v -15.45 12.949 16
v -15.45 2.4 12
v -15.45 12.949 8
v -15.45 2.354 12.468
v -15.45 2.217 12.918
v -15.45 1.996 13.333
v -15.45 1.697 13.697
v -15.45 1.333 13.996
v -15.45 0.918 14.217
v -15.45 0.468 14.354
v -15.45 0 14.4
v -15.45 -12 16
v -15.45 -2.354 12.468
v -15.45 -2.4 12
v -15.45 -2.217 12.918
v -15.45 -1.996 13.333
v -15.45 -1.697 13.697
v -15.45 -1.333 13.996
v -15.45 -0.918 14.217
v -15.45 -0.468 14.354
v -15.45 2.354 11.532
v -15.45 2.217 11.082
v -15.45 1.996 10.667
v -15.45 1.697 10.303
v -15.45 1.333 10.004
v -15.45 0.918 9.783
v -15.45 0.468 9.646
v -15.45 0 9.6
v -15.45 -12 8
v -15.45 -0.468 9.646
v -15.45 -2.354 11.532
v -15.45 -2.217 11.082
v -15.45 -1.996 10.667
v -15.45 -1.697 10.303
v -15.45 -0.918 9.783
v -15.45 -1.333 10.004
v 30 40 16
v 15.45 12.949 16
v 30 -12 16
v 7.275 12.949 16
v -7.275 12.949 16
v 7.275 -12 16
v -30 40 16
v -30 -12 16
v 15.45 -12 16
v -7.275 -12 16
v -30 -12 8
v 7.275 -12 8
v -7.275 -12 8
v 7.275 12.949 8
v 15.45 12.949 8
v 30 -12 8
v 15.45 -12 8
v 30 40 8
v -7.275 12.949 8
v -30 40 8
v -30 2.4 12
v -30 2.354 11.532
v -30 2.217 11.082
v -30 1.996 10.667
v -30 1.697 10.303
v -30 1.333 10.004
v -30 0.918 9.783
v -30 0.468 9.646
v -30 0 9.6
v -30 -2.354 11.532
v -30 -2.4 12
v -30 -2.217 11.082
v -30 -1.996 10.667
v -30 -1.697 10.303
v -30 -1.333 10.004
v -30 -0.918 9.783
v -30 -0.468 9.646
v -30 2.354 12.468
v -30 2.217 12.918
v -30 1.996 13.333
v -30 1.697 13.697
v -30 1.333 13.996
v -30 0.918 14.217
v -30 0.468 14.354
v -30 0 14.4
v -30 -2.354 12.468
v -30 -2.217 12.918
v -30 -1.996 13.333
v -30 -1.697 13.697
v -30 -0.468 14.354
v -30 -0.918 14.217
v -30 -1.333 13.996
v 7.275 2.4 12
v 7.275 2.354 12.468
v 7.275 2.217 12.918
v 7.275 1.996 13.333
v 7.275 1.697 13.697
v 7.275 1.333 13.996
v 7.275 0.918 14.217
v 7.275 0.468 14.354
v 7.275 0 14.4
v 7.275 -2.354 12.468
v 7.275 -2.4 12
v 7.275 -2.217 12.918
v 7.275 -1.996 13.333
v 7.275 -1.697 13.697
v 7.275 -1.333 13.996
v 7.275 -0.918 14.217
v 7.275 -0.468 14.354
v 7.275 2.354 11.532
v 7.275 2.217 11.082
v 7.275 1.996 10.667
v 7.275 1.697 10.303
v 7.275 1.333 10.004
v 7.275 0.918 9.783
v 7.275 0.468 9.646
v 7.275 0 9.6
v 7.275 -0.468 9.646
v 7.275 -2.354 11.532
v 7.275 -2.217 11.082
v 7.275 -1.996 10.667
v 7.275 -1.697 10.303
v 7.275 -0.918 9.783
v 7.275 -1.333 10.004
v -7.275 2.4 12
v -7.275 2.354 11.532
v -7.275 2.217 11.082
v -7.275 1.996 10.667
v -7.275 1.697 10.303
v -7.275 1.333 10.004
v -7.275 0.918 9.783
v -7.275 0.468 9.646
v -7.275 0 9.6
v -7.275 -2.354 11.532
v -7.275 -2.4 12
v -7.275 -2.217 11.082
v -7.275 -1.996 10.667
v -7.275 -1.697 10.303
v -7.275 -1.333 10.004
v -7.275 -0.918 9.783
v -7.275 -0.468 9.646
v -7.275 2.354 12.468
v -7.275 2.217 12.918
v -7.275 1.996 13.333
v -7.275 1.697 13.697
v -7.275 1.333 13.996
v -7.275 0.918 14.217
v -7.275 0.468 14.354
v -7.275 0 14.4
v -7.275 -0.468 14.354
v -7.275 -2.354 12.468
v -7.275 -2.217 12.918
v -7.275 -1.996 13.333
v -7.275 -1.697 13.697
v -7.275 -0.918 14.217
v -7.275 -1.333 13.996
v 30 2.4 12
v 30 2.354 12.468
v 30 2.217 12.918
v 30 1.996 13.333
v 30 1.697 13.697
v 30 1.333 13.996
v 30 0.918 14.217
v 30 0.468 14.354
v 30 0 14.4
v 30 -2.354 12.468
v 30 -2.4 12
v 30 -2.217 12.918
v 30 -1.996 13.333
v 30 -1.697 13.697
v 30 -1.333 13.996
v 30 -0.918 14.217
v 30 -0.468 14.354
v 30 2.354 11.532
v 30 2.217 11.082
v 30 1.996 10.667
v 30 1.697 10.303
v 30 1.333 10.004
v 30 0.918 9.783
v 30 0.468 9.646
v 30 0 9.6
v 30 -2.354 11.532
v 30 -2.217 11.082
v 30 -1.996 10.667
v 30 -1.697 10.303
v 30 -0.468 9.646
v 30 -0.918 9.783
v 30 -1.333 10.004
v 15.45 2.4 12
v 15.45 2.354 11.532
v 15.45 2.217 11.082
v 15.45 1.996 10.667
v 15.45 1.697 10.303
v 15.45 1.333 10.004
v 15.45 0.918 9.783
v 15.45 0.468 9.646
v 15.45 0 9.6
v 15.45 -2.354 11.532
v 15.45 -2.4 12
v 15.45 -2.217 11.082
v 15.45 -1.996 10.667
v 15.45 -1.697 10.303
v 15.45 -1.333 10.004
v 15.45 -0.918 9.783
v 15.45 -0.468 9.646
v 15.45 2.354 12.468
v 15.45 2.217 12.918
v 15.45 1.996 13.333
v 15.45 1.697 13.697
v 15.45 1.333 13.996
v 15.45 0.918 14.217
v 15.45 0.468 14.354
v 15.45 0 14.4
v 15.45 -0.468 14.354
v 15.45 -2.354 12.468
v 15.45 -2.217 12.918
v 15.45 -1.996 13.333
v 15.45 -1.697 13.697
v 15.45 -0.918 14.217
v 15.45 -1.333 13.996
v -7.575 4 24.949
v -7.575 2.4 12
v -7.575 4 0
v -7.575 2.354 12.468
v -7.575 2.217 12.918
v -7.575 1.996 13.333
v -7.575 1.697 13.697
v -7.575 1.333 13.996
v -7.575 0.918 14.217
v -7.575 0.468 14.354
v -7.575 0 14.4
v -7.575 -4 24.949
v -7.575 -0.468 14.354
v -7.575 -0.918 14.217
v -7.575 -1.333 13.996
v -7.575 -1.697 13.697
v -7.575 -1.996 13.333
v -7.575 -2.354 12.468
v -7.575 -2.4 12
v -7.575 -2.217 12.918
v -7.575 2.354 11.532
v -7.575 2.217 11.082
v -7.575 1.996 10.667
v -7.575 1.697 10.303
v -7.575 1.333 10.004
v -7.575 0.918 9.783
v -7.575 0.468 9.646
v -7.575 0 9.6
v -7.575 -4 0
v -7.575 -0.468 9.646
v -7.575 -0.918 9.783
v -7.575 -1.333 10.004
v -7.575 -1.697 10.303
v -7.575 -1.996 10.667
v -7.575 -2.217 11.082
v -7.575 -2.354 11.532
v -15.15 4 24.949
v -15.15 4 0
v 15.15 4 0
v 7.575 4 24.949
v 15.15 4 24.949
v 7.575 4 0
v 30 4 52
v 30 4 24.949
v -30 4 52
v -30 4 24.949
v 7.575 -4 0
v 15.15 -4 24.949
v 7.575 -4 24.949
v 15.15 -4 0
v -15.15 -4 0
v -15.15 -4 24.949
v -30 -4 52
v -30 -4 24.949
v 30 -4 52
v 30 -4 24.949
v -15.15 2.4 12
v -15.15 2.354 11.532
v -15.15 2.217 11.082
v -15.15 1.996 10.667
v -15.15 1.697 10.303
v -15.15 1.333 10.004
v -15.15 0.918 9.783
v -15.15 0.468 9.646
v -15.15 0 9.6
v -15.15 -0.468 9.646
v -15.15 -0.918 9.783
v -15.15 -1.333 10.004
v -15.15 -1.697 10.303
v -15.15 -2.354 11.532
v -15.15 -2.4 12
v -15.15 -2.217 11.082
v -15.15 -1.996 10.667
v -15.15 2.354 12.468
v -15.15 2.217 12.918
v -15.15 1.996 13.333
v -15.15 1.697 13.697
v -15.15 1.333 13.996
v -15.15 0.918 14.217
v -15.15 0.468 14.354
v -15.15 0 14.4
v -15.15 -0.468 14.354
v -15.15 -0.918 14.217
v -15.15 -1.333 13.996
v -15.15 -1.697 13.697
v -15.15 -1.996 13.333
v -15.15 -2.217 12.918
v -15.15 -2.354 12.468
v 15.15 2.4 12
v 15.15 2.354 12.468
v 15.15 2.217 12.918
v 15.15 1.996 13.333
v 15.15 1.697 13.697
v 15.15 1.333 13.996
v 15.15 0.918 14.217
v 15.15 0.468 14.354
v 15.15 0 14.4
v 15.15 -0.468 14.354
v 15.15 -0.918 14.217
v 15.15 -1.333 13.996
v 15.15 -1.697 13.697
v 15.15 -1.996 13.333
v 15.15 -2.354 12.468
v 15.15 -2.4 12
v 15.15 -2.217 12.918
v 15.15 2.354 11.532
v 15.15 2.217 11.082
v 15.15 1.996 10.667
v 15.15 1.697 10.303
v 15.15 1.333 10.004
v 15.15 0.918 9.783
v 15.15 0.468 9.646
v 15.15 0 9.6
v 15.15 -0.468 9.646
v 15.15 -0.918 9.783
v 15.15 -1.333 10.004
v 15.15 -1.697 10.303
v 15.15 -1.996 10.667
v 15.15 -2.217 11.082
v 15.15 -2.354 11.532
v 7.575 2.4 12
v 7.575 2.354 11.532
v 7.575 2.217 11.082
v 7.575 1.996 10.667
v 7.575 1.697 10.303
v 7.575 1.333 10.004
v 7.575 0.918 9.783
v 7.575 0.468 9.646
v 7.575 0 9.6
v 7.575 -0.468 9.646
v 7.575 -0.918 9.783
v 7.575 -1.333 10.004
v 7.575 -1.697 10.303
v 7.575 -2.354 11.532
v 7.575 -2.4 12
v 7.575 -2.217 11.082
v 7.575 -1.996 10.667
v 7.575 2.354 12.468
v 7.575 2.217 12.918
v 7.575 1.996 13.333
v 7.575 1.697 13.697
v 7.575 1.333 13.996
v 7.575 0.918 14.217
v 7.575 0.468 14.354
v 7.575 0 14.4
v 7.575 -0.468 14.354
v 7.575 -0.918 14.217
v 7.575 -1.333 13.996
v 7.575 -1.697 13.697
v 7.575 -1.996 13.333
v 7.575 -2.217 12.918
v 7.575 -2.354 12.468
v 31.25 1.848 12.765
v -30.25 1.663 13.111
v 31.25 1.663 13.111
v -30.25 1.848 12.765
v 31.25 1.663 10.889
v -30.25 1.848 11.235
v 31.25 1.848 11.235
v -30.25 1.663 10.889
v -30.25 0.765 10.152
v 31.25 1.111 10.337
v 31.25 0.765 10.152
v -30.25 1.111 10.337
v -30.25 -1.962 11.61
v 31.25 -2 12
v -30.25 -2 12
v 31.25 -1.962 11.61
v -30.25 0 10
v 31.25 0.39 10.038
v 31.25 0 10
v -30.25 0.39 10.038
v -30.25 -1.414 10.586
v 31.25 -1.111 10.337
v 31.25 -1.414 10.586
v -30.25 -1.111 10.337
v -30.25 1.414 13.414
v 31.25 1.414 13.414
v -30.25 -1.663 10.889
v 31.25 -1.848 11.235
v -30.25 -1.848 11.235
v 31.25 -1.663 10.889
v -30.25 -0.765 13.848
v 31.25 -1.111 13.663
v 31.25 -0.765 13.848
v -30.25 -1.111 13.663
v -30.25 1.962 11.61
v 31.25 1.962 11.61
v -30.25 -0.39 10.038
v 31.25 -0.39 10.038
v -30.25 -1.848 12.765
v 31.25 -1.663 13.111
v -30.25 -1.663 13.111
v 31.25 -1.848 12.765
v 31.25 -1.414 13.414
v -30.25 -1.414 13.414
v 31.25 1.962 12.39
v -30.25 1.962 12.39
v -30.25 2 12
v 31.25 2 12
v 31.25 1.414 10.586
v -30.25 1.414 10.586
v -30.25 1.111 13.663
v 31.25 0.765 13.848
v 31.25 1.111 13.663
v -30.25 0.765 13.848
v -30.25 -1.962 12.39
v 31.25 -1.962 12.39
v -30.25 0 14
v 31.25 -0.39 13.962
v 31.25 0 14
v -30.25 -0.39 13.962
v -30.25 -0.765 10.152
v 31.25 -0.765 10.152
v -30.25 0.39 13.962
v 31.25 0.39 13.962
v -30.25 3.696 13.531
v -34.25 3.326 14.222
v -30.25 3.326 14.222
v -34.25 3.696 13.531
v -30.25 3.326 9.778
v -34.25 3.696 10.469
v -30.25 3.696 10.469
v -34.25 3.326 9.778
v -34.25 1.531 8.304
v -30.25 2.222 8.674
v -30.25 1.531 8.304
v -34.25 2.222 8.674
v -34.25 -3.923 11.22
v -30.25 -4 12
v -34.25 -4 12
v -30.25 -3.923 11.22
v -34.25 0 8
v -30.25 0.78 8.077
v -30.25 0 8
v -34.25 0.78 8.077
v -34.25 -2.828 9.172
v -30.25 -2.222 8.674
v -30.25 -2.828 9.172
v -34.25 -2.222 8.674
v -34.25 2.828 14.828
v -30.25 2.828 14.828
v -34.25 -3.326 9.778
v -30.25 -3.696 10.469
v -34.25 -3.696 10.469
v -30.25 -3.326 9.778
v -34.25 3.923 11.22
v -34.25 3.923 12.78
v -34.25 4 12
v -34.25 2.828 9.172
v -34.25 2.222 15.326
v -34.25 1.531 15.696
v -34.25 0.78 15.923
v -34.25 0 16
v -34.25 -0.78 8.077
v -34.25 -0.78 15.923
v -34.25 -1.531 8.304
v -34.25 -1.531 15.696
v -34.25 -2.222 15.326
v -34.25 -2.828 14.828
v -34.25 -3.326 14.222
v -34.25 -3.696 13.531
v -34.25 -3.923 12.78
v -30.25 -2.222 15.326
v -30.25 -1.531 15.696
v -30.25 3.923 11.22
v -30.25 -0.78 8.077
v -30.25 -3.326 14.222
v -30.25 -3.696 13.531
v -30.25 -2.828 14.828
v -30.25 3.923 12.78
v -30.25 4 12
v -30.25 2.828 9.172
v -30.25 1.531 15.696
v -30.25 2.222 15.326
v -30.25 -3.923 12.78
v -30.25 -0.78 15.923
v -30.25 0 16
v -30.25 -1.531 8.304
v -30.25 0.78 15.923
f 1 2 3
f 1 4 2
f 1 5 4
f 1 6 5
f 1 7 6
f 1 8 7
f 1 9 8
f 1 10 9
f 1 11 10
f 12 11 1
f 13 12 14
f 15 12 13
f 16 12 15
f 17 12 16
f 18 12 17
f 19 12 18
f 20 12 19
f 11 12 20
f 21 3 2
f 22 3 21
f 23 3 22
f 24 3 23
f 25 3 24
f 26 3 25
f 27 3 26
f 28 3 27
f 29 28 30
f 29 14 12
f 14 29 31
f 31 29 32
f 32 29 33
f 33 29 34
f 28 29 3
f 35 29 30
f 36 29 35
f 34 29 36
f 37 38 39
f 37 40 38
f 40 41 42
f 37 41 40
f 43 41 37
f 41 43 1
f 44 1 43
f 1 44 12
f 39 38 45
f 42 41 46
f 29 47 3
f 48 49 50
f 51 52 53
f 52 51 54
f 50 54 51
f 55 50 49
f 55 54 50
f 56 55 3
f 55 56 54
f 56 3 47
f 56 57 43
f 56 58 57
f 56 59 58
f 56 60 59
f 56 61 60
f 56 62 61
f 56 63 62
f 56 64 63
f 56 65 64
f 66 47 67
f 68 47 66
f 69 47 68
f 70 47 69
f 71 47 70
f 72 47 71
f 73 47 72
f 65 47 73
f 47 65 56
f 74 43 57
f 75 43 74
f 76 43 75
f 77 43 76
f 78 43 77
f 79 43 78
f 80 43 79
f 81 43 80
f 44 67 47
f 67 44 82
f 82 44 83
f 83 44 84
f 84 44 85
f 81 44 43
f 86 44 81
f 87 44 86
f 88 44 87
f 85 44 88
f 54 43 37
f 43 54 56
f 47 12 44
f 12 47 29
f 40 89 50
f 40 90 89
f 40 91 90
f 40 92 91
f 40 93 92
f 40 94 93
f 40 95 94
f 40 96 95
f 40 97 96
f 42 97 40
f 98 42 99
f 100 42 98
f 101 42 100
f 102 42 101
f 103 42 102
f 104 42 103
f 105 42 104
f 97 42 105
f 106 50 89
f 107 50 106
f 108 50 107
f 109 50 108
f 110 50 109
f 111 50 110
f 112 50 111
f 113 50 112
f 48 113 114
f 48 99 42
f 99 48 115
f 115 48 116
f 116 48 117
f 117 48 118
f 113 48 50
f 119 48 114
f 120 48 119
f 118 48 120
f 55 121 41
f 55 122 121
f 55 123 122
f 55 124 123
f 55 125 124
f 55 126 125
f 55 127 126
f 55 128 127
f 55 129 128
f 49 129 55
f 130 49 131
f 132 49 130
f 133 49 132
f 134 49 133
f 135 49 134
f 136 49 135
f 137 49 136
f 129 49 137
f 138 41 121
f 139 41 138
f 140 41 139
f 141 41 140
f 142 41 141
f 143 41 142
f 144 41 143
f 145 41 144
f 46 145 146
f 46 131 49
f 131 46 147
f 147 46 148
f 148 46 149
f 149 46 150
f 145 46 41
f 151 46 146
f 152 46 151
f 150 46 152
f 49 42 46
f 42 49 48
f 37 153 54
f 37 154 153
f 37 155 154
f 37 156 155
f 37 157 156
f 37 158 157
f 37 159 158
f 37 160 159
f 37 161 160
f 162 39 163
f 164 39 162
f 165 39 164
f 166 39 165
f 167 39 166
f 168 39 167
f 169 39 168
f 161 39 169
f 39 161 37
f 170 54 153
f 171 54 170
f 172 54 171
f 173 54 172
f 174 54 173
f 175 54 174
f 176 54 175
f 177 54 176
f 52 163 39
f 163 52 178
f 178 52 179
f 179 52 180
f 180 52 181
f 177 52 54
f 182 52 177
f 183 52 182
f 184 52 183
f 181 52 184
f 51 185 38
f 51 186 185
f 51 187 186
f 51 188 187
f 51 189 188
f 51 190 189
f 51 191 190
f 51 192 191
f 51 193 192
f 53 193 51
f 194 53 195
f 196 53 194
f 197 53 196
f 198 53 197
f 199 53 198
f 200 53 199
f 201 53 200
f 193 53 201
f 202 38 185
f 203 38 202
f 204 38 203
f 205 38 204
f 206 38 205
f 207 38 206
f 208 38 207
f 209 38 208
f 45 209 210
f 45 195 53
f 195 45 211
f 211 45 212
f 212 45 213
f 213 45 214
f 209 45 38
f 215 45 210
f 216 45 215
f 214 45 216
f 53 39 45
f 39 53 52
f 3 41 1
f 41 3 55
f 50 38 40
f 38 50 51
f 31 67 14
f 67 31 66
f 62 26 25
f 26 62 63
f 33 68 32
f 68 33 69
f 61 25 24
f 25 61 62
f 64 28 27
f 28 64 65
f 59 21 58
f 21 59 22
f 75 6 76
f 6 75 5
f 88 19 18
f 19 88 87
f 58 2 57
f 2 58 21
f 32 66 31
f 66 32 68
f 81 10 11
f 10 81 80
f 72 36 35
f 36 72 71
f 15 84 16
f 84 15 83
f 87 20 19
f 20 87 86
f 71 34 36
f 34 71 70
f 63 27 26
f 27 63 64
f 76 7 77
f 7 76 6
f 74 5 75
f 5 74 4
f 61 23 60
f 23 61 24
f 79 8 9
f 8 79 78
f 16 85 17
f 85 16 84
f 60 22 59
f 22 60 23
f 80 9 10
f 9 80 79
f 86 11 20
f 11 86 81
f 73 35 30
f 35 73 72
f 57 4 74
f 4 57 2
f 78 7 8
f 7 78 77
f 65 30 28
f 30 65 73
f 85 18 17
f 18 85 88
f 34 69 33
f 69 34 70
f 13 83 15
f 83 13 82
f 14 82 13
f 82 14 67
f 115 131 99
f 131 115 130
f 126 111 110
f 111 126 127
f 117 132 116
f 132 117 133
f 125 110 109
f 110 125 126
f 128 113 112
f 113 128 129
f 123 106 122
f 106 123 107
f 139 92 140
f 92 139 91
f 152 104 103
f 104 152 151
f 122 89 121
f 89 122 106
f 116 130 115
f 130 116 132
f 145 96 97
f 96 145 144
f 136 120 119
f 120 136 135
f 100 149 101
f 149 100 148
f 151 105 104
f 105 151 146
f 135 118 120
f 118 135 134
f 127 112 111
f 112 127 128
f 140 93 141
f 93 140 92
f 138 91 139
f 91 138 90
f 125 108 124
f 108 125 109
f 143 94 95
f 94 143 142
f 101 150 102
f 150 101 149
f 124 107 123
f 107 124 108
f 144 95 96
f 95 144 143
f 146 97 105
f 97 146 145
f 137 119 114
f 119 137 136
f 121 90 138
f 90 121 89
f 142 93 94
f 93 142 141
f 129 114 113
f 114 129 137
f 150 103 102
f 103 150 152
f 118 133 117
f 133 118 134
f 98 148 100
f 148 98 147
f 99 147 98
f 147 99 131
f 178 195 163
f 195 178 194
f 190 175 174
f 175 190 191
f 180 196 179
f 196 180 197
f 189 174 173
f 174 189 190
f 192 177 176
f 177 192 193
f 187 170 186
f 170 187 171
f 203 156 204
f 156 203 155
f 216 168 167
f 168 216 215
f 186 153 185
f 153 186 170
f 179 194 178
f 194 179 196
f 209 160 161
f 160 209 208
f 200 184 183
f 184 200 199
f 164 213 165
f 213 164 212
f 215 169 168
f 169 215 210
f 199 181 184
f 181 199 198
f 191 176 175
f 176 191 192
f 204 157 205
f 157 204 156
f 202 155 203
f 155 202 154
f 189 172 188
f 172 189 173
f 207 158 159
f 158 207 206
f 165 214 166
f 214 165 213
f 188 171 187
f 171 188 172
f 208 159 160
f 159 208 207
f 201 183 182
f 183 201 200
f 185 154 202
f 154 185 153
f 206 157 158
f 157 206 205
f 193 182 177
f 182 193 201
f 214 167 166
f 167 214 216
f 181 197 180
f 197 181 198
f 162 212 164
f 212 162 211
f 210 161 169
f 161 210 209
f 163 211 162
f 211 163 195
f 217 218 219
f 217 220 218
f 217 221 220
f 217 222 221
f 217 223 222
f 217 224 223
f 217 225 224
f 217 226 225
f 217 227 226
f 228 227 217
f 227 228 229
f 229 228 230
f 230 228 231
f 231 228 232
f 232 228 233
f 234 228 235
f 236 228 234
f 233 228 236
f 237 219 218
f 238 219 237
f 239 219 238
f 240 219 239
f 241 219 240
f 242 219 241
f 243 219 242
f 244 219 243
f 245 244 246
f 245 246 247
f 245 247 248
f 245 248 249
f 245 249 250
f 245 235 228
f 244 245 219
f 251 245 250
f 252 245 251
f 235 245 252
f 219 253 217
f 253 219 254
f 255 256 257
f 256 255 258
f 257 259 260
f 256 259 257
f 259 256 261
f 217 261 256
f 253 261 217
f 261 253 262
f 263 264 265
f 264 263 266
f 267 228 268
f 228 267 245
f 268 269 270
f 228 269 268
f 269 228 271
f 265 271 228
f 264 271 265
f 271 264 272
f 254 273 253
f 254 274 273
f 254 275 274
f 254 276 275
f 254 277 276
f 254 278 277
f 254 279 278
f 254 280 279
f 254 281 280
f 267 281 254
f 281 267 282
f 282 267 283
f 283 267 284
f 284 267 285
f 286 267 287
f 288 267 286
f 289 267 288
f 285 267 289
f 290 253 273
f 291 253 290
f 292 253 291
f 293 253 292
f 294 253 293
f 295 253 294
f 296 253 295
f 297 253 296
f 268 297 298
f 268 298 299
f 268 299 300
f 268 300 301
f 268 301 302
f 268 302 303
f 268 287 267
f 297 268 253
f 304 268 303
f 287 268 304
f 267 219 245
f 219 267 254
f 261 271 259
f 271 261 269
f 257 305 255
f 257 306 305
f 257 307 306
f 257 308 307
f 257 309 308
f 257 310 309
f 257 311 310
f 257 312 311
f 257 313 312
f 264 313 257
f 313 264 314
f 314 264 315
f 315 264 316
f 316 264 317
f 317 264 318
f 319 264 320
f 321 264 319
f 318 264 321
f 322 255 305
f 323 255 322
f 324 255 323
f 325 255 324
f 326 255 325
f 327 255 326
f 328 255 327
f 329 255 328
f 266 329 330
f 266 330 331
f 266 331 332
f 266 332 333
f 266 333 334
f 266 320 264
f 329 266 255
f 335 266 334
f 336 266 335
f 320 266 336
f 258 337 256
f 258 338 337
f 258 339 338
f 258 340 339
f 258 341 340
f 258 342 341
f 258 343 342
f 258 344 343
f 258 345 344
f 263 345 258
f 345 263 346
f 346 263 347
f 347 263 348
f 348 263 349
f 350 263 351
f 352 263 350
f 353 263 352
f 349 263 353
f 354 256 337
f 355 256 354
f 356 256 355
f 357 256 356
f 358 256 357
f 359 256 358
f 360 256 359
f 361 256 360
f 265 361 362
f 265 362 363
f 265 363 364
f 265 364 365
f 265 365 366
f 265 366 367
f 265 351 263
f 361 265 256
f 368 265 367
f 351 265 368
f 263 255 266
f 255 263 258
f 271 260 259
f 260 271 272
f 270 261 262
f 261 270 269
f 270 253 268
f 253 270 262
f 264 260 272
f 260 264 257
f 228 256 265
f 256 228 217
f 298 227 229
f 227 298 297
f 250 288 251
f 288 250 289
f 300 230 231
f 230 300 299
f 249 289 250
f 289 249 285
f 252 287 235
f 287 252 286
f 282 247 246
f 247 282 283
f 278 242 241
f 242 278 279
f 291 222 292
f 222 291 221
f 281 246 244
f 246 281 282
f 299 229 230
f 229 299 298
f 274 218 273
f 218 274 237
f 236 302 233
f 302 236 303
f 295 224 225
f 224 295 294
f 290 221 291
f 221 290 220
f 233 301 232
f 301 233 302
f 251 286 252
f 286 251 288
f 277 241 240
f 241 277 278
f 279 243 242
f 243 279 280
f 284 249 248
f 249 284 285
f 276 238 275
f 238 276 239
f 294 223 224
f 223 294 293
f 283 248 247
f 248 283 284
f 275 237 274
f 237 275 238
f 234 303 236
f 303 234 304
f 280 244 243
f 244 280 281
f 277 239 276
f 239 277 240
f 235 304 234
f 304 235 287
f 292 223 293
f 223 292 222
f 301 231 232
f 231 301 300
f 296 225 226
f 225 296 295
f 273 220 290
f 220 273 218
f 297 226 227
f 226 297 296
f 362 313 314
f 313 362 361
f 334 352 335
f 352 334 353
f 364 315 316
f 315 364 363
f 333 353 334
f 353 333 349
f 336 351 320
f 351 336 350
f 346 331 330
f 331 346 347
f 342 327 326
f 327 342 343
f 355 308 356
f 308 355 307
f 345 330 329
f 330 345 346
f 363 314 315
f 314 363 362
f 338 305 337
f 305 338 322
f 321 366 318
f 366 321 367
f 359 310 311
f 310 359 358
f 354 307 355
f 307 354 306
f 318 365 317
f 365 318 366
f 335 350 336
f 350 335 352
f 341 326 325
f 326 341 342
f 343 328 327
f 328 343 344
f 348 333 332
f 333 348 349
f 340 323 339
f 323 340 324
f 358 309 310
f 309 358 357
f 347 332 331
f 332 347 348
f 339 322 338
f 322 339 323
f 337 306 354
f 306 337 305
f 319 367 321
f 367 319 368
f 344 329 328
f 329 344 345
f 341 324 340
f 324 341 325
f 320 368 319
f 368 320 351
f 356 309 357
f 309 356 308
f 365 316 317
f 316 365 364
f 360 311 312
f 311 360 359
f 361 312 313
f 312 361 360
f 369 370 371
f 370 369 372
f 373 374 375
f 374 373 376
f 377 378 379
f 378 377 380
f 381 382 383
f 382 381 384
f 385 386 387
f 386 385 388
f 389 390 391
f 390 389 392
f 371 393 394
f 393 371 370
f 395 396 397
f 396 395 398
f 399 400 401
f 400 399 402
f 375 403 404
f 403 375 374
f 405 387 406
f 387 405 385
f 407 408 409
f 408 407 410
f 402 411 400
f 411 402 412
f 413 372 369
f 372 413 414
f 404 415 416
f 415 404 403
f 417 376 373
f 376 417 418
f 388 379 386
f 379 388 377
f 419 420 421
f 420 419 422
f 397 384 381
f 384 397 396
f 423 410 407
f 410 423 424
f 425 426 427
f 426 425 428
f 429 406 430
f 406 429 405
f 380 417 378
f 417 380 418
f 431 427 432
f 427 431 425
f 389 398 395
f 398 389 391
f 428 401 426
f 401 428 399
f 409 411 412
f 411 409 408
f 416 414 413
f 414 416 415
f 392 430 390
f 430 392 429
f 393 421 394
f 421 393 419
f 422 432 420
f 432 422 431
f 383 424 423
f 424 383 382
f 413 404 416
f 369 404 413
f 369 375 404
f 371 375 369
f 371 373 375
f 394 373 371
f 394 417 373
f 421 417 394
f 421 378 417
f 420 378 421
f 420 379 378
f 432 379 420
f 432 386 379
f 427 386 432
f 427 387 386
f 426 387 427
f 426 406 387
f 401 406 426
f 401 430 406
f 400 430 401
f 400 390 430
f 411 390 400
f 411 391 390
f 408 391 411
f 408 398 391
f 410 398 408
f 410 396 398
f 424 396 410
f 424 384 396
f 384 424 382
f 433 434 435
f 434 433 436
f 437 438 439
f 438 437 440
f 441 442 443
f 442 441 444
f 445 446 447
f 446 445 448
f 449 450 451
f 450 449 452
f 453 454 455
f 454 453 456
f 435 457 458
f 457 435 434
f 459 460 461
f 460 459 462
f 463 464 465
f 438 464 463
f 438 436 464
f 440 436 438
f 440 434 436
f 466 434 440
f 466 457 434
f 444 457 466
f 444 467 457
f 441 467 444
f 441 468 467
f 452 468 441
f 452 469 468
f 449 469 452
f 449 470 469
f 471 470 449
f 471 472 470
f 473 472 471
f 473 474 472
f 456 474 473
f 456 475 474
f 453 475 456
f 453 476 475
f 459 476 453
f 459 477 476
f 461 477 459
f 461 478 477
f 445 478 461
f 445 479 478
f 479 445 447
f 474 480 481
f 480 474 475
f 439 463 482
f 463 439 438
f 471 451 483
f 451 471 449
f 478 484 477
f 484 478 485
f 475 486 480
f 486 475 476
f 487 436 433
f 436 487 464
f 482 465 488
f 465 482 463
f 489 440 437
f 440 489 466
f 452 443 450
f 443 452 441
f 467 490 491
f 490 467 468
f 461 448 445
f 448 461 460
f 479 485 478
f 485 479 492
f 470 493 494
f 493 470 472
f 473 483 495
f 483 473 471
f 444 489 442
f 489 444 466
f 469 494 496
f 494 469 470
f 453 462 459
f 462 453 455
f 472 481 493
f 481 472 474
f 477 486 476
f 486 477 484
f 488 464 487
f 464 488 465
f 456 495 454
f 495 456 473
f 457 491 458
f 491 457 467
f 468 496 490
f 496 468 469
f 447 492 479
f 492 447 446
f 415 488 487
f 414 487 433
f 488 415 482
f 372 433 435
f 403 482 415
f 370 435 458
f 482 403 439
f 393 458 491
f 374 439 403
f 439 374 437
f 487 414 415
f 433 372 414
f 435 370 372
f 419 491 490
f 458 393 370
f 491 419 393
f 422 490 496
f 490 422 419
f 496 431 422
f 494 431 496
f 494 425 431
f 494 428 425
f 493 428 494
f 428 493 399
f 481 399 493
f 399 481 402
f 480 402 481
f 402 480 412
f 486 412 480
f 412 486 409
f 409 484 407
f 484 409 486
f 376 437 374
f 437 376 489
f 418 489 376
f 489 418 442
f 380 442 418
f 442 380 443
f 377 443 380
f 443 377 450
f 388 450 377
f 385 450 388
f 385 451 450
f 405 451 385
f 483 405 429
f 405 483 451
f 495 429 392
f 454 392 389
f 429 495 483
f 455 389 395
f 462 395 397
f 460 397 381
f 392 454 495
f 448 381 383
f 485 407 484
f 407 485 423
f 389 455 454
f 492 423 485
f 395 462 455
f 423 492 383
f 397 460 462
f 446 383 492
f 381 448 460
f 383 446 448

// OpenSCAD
$fn = 32;

// ------------------------------------------------------------------------
// Butt hinge: hinge 60 mm, leaf swung 270 deg
// Every part is its own module, assembly() places every instance.
// ------------------------------------------------------------------------

// --- part 1 ---
module hinge_base() {
  difference() {
    union() {
      translate([-30, -12, -4]) cube([14.55, 52, 8]);
      translate([-7.275, -12, -4]) cube([14.55, 52, 8]);
      translate([15.45, -12, -4]) cube([14.55, 52, 8]);
      translate([-30, 12.949, -4]) cube([60, 27.051, 8]);
    }
    translate([-22.725, 0, 0]) rotate([0, 90, 0]) cylinder(h = 16.55, d = 4.8, center = true);
    translate([0, 0, 0]) rotate([0, 90, 0]) cylinder(h = 16.55, d = 4.8, center = true);
    translate([22.725, 0, 0]) rotate([0, 90, 0]) cylinder(h = 16.55, d = 4.8, center = true);
  }
}

// --- part 2 ---
module hinge_mover() {
  difference() {
    union() {
      translate([-15.15, -40, -4]) cube([7.575, 52, 8]);
      translate([7.575, -40, -4]) cube([7.575, 52, 8]);
      translate([-30, -40, -4]) cube([60, 27.051, 8]);
    }
    translate([-11.362, 0, 0]) rotate([0, 90, 0]) cylinder(h = 9.575, d = 4.8, center = true);
    translate([11.362, 0, 0]) rotate([0, 90, 0]) cylinder(h = 9.575, d = 4.8, center = true);
  }
}

// --- part 3 ---
module hinge_pin() {
  rotate([0, 90, 0]) cylinder(h = 62.5, d = 4, center = true);
  translate([-34.25, 0, 0]) rotate([0, 90, 0]) cylinder(h = 4, d = 8);
}

// --- assembly ---
module assembly() {
  color([0.80, 0.24, 0.20]) translate([0, 0, 12]) rotate([0, 0, 0]) hinge_base();
  color([0.20, 0.45, 0.75]) translate([0, 0, 12]) rotate([270, 0, 0]) hinge_mover();
  color([0.25, 0.62, 0.32]) translate([0, 0, 12]) rotate([0, 0, 0]) hinge_pin();
}

assembly();
